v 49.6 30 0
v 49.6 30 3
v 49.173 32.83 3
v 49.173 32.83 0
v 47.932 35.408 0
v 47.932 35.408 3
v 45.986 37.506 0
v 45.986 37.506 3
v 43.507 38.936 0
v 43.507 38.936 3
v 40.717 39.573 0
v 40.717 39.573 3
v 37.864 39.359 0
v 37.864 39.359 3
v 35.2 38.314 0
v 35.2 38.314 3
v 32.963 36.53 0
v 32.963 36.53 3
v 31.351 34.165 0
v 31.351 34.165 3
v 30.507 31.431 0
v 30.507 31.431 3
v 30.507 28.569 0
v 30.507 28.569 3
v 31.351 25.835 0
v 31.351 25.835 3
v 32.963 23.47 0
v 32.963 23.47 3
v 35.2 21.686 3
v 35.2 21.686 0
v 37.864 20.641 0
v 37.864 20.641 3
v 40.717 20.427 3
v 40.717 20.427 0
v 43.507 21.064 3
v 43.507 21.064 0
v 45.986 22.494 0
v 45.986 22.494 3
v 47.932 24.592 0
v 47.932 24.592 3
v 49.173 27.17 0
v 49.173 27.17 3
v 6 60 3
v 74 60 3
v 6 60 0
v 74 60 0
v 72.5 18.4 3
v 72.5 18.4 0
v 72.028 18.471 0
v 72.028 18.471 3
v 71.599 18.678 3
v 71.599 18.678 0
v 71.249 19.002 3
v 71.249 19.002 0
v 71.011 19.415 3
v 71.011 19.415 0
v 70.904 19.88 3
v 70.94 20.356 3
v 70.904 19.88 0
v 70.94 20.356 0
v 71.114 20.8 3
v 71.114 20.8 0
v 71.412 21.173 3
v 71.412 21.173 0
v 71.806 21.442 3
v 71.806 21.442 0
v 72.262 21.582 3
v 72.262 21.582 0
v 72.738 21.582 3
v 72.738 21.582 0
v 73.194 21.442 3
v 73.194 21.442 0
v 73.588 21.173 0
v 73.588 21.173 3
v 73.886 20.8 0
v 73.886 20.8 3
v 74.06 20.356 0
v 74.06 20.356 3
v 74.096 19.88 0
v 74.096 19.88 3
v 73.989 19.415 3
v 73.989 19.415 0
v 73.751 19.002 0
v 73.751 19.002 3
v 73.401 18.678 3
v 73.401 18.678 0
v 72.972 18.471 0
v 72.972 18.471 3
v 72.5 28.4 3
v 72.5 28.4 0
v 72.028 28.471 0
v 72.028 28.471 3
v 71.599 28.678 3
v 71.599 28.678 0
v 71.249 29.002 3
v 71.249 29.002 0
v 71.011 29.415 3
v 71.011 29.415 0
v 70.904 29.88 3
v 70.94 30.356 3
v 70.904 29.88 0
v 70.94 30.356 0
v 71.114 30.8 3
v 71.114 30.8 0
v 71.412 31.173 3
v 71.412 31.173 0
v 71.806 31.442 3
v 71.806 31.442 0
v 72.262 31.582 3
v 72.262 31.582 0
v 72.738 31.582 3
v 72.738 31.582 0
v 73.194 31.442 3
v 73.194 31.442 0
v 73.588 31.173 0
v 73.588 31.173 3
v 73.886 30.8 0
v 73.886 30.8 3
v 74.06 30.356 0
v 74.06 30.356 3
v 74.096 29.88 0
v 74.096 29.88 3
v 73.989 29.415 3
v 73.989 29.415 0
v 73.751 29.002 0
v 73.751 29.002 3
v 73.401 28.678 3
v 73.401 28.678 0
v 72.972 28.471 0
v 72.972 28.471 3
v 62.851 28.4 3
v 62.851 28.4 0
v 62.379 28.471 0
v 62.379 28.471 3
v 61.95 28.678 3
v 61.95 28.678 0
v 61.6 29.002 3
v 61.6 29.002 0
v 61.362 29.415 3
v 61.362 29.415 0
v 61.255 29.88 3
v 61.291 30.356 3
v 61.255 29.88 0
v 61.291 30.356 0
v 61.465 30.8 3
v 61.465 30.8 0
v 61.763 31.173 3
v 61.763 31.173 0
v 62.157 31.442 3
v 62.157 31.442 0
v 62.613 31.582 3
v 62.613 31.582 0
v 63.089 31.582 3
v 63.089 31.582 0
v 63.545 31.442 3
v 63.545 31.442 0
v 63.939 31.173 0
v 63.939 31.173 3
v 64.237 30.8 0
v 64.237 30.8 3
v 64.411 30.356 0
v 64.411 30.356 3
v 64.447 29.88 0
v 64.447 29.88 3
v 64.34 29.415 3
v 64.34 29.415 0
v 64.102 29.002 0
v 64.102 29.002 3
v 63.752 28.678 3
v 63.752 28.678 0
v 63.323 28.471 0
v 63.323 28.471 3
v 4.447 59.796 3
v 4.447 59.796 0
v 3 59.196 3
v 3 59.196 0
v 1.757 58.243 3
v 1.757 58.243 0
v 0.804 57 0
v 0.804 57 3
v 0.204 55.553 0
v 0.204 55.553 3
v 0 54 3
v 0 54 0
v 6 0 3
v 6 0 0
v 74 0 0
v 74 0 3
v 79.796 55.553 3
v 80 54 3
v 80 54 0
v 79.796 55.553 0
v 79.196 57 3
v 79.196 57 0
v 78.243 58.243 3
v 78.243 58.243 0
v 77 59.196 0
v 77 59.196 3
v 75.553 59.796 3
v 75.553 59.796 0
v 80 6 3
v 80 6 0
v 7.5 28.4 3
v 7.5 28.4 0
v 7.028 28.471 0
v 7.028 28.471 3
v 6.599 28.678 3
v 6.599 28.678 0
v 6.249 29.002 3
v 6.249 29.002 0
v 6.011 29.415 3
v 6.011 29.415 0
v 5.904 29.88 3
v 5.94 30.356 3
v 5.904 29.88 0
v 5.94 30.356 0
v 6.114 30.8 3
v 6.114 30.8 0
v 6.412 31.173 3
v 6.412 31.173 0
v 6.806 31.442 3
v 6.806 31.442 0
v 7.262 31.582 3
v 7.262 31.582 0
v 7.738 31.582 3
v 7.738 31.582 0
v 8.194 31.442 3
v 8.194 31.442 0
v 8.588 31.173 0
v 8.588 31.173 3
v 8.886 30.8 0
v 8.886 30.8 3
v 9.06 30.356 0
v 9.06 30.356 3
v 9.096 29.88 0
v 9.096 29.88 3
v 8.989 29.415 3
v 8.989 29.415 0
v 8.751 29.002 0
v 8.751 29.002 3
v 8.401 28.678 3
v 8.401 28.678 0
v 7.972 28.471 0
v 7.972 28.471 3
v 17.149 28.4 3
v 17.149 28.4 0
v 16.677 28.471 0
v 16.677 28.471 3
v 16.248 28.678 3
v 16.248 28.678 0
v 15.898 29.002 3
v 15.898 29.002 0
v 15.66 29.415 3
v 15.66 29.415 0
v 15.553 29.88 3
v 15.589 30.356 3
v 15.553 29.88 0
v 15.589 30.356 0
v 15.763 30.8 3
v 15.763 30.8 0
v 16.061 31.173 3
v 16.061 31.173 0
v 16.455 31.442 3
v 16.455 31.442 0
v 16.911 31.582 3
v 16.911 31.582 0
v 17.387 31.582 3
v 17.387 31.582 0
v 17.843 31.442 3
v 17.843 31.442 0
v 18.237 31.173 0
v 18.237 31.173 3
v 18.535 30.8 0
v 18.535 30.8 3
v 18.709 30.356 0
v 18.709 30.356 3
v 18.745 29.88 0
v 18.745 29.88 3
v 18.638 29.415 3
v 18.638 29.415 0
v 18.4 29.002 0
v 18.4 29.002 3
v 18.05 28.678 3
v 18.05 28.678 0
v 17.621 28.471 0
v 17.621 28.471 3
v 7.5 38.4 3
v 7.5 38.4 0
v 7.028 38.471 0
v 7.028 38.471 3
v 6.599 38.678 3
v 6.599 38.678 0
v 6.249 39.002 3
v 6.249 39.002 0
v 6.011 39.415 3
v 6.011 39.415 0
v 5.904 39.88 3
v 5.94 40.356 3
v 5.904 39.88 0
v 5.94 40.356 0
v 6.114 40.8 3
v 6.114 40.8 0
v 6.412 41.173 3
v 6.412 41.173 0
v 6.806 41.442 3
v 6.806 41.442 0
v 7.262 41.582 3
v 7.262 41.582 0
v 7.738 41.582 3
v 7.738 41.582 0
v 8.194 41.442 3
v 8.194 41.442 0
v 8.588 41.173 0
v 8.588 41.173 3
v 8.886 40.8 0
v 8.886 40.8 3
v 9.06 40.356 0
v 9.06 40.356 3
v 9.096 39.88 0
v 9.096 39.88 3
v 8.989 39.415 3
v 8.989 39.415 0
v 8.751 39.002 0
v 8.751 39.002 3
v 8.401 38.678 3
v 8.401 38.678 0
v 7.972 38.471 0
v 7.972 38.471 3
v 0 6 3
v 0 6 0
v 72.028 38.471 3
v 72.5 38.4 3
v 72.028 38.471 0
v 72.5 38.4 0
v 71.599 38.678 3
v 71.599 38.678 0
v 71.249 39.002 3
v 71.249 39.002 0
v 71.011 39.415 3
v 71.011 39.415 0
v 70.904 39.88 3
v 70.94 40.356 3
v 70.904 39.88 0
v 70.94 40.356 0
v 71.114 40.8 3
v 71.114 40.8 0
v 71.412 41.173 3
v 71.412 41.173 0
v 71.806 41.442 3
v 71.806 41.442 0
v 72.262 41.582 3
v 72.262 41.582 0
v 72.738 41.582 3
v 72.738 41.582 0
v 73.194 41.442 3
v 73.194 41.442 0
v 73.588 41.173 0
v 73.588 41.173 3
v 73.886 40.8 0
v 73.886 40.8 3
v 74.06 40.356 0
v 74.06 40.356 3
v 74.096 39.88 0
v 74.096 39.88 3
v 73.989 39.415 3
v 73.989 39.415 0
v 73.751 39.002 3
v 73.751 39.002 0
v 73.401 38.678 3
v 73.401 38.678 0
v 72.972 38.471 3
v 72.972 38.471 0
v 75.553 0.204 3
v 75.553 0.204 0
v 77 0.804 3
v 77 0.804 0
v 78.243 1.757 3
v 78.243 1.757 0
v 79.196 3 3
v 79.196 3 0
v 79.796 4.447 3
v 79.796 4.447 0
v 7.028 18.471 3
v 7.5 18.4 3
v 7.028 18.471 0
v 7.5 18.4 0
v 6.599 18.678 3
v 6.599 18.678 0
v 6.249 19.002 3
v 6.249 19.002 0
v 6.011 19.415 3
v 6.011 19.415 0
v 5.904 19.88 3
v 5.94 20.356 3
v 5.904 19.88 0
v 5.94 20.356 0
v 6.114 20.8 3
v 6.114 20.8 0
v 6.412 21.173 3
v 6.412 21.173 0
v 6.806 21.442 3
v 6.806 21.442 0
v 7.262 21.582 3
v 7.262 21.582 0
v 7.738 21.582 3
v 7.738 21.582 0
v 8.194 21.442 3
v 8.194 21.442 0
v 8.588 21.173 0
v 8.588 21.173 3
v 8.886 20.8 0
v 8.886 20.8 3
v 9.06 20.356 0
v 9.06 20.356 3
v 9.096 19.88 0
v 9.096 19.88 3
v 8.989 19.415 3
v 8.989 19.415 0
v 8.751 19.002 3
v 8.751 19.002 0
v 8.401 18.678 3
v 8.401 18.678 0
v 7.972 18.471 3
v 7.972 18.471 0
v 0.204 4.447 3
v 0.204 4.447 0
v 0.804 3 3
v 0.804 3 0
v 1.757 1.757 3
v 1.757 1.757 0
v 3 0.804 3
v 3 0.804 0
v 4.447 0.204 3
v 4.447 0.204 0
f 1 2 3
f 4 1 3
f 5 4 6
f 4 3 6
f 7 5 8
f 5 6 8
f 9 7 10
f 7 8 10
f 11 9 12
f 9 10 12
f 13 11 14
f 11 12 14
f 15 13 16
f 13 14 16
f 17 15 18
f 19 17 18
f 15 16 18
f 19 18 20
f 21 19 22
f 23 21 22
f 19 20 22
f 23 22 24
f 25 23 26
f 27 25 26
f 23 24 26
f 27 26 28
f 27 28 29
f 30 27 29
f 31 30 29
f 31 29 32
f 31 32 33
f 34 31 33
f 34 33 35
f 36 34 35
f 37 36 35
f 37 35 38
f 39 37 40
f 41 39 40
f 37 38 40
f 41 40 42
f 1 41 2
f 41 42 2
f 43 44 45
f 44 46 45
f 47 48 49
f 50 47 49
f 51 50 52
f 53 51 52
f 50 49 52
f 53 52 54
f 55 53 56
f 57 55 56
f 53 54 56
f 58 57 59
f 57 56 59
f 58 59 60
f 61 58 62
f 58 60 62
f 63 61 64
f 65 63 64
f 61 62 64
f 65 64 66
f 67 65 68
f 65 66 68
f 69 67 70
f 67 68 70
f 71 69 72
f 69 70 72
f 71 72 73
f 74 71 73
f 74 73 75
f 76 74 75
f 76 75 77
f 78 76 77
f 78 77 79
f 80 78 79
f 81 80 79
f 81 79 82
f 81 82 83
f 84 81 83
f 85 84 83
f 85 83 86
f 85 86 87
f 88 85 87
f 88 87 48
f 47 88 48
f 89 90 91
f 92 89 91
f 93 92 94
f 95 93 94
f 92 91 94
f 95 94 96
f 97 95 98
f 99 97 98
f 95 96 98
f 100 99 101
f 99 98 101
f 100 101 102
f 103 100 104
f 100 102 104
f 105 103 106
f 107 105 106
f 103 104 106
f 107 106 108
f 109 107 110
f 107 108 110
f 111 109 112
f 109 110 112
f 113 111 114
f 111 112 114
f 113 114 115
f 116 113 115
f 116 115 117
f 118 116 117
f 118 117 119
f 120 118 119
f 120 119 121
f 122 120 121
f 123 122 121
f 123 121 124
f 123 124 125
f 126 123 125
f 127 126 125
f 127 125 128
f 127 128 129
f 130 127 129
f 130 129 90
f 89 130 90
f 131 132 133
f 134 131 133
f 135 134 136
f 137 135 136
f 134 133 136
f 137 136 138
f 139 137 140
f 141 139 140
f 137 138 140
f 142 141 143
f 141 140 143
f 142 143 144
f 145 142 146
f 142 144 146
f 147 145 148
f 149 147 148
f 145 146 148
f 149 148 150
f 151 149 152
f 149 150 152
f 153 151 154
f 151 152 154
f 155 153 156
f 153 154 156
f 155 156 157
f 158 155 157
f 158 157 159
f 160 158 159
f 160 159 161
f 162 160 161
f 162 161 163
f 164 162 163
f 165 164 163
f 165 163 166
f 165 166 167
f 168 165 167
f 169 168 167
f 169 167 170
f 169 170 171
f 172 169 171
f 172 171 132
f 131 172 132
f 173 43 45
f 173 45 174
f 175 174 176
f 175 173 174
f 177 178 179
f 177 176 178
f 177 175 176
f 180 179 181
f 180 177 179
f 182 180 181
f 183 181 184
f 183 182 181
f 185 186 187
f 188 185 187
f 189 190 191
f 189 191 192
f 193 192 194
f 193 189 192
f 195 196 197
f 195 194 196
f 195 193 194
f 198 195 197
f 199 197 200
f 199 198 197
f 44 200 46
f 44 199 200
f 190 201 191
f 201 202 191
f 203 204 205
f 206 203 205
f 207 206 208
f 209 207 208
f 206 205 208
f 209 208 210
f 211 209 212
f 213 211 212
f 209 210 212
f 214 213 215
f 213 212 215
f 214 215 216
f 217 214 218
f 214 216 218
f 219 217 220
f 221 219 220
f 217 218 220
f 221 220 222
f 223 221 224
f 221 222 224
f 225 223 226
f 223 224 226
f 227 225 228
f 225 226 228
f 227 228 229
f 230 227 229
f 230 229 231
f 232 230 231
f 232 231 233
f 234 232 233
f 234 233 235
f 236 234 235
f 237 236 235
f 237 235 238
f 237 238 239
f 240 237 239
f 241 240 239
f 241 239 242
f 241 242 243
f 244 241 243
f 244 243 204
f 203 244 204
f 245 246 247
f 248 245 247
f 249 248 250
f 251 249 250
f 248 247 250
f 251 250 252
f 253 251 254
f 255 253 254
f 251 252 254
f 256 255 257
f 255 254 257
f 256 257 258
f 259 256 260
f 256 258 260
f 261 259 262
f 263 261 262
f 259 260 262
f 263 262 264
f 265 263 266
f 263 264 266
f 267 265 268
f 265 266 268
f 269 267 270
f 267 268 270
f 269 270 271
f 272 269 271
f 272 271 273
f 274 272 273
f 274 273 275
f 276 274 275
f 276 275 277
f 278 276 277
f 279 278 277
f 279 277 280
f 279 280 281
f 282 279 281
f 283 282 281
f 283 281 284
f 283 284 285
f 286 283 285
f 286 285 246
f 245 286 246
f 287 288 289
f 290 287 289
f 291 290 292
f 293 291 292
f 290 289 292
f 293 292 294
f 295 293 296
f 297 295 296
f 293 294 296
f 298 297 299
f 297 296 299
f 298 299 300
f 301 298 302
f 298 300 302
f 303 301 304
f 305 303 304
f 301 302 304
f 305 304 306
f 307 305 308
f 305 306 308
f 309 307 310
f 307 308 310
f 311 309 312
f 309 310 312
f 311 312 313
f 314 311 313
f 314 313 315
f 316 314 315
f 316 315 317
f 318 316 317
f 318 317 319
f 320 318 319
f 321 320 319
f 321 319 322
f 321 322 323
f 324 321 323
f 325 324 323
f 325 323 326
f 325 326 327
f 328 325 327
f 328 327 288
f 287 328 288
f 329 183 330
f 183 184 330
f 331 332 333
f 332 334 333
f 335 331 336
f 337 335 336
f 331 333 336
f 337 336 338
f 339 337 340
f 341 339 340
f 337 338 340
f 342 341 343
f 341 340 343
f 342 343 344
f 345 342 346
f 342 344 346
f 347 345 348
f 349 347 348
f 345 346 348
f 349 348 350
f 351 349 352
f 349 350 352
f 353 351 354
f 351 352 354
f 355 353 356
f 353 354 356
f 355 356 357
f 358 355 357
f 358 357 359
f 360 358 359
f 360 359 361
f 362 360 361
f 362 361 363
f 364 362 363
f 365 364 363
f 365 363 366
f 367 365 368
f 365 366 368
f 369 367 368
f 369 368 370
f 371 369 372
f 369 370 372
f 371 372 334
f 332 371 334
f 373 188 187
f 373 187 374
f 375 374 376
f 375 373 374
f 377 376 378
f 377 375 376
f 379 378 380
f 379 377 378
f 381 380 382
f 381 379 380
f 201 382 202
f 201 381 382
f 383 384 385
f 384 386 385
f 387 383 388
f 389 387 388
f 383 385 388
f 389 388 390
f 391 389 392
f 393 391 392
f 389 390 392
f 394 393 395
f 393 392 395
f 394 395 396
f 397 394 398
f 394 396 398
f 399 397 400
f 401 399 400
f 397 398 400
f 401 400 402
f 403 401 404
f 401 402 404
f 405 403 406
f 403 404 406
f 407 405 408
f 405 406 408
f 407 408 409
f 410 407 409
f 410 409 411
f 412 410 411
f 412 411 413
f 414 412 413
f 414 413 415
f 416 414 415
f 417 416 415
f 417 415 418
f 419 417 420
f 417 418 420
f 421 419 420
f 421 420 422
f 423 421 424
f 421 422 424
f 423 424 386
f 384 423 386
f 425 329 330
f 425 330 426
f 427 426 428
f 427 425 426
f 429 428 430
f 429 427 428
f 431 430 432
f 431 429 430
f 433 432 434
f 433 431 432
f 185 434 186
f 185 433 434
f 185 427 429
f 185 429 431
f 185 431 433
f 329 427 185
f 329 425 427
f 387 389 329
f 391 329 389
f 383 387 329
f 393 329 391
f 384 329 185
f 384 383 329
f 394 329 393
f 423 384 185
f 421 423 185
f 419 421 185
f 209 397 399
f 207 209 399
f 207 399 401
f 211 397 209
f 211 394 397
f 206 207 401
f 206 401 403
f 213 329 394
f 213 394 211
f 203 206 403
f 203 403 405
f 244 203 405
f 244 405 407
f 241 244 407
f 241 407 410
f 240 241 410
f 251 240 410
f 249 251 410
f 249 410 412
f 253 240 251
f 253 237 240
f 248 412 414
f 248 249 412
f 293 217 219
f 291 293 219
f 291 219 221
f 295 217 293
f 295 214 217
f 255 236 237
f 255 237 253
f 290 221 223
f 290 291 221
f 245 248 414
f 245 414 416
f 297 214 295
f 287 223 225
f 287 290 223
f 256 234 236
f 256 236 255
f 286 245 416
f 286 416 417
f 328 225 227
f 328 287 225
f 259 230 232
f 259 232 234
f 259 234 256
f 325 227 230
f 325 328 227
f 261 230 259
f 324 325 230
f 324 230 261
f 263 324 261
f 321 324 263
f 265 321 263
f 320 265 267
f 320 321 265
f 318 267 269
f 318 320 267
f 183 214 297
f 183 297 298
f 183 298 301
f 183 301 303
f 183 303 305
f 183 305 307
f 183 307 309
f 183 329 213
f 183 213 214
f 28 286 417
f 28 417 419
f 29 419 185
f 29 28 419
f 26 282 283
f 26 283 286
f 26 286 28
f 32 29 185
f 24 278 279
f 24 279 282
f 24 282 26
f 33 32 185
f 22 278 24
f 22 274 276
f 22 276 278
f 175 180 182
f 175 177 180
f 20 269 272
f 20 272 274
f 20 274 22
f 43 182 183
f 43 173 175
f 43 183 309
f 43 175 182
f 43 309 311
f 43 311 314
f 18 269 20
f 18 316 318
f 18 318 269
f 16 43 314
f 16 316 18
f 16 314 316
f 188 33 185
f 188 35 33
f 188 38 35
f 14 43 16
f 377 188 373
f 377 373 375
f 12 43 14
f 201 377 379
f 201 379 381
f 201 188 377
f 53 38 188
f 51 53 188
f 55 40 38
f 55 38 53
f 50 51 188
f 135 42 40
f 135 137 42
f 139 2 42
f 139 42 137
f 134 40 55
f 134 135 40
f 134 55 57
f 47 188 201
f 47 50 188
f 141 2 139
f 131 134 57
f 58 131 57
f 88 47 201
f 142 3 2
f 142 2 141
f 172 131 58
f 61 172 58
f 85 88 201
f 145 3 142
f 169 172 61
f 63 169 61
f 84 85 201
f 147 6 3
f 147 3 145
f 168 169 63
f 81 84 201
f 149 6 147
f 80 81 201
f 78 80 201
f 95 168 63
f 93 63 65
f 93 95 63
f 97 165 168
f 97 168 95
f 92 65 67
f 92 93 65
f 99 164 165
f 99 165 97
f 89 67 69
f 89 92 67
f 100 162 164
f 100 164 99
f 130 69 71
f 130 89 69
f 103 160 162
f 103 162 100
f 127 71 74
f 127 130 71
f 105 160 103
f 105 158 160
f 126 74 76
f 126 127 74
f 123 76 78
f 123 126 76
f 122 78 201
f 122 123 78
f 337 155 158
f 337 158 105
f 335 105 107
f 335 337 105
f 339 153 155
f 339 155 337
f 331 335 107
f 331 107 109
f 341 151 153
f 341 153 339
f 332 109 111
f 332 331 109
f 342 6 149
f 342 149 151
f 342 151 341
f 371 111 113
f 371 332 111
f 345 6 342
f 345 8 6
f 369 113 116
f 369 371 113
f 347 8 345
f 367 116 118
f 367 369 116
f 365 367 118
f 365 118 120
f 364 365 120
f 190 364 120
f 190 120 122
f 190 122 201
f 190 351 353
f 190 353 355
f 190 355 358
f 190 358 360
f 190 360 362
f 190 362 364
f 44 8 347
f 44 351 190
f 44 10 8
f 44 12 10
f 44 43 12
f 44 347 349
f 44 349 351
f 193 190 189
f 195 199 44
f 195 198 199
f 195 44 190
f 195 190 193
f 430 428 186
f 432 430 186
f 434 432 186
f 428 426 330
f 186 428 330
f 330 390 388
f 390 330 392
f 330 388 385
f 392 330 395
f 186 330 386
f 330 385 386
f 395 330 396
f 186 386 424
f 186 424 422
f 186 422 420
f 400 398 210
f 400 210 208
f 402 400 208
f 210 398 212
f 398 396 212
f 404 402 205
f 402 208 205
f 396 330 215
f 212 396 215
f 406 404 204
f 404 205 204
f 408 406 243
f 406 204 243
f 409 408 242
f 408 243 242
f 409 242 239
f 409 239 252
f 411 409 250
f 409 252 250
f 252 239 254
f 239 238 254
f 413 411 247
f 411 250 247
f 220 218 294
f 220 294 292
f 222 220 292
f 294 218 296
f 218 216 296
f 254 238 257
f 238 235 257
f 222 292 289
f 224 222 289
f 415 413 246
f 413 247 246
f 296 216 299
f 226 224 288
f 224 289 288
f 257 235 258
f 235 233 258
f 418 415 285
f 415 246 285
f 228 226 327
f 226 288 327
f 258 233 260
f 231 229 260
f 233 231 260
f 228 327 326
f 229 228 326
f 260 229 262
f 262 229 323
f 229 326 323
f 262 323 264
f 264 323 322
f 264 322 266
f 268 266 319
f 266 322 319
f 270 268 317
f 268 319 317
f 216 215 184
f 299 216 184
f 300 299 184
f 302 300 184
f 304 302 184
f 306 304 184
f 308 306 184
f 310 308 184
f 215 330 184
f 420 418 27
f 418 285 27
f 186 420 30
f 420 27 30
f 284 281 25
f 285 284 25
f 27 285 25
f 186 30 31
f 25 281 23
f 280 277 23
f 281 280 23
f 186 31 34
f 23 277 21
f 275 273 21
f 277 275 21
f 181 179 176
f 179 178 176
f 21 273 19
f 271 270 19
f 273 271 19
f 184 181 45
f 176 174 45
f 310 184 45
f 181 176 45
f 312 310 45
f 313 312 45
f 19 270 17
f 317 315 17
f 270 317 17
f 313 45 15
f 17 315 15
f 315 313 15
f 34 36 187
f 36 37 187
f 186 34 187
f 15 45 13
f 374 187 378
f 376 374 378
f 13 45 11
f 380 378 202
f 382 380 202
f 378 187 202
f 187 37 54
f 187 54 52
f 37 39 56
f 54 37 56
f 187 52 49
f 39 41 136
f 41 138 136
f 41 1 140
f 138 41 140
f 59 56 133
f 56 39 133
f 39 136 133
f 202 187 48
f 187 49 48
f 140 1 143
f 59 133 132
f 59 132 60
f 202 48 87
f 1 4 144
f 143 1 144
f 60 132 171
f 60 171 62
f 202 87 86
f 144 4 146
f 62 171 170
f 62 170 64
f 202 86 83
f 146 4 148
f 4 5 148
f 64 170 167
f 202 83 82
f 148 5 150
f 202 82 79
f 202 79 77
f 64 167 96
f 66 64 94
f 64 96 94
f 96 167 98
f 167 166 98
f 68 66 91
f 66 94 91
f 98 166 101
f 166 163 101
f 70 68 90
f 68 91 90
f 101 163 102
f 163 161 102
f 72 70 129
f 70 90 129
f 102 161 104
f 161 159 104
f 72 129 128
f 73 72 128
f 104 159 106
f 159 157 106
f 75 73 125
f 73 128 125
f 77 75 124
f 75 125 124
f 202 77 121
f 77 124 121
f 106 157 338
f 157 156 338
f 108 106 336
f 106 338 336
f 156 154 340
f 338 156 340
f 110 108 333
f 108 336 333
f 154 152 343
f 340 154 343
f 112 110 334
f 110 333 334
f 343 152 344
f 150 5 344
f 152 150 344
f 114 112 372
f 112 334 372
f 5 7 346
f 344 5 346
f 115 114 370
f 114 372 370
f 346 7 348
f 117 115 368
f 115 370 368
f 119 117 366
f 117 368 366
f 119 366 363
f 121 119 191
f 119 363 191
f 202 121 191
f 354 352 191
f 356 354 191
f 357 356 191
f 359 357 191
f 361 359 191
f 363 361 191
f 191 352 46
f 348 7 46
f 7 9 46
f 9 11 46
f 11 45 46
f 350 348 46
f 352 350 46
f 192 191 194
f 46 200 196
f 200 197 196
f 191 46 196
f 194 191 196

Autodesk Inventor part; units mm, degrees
ref_plane "YZ Plane" through (0, 0, 0) normal (1, 0, 0) x (0, 1, 0)
ref_plane "XZ Plane" through (0, 0, 0) normal (0, 1, 0) x (-1, 0, 0)
ref_plane "XY Plane" through (0, 0, 0) normal (0, 0, 1) x (1, 0, 0)
sketch "スケッチ1" plane through (0, 0, 0) normal (0, 0, 1) x (1, 0, 0)
  line L0 (0, 0) -> (80, 0)
  line L1 (80, 0) -> (80, 60)
  line L2 (80, 60) -> (0, 60)
  line L3 (0, 60) -> (0, 0)
  dimension "d0" = 80
  dimension "d1" = 60
extrude "押し出し1" add sketch "スケッチ1" along normal blind 3
sketch "スケッチ2" plane through (0, 0, 3) normal (0, 0, 1) x (1, 0, 0)
  point P0 (0, 0)
sketch "スケッチ3" plane through (0, 0, 3) normal (0, 0, 1) x (1, 0, 0)
  line L0 (0, 0) -> (80, 0) projected
  line L1 (15, 0) -> (15, 60) construction
  line L2 (15, 0) -> (75, 0) construction
  line L3 (0, 60) -> (0, 0) projected
  circle A0 centre (7.5, 30) radius 1.6
  circle A1 centre (7.5, 40) radius 1.6
  circle A2 centre (7.5, 20) radius 1.6
  line L4 (80, 60) -> (0, 60) projected
  line L5 (40, 60) -> (40, 0) construction
  circle A3 centre (72.5, 30) radius 1.6
  circle A4 centre (72.5, 40) radius 1.6
  circle A5 centre (72.5, 20) radius 1.6
  point P0 (0, 30)
  dimension "d4" = 60
  dimension "d5" = 90
  dimension "d6" = 15
  dimension "d7" = 3.2
  dimension "d8" = 7.5
  dimension "d9" = 30
  dimension "d10" = 3.2
  dimension "d11" = 3.2
  dimension "d12" = 10
  dimension "d13" = 10
  dimension "d14" = 40
hole "穴1" at (7.5, 40, 3) at (7.5, 30, 3) at (7.5, 20, 3) at (72.5, 40, 3) at (72.5, 30, 3) at (72.5, 20, 3) direction (0, 0, -1) diameter 3.2 end through all
sketch "スケッチ4" plane through (0, 0, 3) normal (0, 0, 1) x (1, 0, 0)
  circle A0 centre (40, 30) radius 7.5
  line L0 (80, 60) -> (0, 60) projected
  line L1 (80, 0) -> (80, 60) projected
  point P0 (0, 0)
  dimension "d22" = 15
  dimension "d23" = 30
  dimension "d24" = 40
extrude "押し出し2" cut sketch "スケッチ4" against normal blind 3
sketch "スケッチ5" plane through (0, 0, 3) normal (0, 0, 1) x (1, 0, 0)
  point P0 (0, 0)
sketch "スケッチ6" plane through (0, 0, 3) normal (0, 0, 1) x (1, 0, 0)
  circle A0 centre (40, 30) radius 7.5 projected
  circle A1 centre (40, 30) radius 12.05
  point P0 (0, 0)
  dimension "d27" = 24.1
extrude "押し出し3" cut sketch "スケッチ6" against normal blind 3
sketch "スケッチ7" plane through (0, 0, 3) normal (0, 0, 1) x (1, 0, 0)
  circle A0 centre (40, 30) radius 12.05 projected
  line L0 (0, 0) -> (80, 0) projected
  point P0 (62.851, 30)
  point P1 (17.149, 30)
  dimension "d30" = 22.851
  dimension "d31" = 22.851
  dimension "d32" = 30
  dimension "d33" = 30
hole "穴2" at (17.149, 30, 3) at (62.851, 30, 3) direction (0, 0, -1) diameter 3.2 end through all
fillet "フィレット1" radius 6 4 edges at (0, 60, 1.5) (80, 60, 1.5) (80, 0, 1.5) (0, 0, 1.5)
sketch "スケッチ8" plane through (0, 0, 3) normal (0, 0, 1) x (1, 0, 0)
  point P0 (0, 0)
sketch "スケッチ9" plane through (0, 0, 3) normal (0, 0, 1) x (1, 0, 0)
  circle A0 centre (40, 30) radius 12.05 projected
  circle A1 centre (40, 30) radius 9.6
  point P0 (0, 0)
  dimension "d42" = 19.2
extrude "押し出し4" add sketch "スケッチ9" against normal blind 3
properties part number "射出_エンコーダー固定2" material "アルミニウム 6061"
